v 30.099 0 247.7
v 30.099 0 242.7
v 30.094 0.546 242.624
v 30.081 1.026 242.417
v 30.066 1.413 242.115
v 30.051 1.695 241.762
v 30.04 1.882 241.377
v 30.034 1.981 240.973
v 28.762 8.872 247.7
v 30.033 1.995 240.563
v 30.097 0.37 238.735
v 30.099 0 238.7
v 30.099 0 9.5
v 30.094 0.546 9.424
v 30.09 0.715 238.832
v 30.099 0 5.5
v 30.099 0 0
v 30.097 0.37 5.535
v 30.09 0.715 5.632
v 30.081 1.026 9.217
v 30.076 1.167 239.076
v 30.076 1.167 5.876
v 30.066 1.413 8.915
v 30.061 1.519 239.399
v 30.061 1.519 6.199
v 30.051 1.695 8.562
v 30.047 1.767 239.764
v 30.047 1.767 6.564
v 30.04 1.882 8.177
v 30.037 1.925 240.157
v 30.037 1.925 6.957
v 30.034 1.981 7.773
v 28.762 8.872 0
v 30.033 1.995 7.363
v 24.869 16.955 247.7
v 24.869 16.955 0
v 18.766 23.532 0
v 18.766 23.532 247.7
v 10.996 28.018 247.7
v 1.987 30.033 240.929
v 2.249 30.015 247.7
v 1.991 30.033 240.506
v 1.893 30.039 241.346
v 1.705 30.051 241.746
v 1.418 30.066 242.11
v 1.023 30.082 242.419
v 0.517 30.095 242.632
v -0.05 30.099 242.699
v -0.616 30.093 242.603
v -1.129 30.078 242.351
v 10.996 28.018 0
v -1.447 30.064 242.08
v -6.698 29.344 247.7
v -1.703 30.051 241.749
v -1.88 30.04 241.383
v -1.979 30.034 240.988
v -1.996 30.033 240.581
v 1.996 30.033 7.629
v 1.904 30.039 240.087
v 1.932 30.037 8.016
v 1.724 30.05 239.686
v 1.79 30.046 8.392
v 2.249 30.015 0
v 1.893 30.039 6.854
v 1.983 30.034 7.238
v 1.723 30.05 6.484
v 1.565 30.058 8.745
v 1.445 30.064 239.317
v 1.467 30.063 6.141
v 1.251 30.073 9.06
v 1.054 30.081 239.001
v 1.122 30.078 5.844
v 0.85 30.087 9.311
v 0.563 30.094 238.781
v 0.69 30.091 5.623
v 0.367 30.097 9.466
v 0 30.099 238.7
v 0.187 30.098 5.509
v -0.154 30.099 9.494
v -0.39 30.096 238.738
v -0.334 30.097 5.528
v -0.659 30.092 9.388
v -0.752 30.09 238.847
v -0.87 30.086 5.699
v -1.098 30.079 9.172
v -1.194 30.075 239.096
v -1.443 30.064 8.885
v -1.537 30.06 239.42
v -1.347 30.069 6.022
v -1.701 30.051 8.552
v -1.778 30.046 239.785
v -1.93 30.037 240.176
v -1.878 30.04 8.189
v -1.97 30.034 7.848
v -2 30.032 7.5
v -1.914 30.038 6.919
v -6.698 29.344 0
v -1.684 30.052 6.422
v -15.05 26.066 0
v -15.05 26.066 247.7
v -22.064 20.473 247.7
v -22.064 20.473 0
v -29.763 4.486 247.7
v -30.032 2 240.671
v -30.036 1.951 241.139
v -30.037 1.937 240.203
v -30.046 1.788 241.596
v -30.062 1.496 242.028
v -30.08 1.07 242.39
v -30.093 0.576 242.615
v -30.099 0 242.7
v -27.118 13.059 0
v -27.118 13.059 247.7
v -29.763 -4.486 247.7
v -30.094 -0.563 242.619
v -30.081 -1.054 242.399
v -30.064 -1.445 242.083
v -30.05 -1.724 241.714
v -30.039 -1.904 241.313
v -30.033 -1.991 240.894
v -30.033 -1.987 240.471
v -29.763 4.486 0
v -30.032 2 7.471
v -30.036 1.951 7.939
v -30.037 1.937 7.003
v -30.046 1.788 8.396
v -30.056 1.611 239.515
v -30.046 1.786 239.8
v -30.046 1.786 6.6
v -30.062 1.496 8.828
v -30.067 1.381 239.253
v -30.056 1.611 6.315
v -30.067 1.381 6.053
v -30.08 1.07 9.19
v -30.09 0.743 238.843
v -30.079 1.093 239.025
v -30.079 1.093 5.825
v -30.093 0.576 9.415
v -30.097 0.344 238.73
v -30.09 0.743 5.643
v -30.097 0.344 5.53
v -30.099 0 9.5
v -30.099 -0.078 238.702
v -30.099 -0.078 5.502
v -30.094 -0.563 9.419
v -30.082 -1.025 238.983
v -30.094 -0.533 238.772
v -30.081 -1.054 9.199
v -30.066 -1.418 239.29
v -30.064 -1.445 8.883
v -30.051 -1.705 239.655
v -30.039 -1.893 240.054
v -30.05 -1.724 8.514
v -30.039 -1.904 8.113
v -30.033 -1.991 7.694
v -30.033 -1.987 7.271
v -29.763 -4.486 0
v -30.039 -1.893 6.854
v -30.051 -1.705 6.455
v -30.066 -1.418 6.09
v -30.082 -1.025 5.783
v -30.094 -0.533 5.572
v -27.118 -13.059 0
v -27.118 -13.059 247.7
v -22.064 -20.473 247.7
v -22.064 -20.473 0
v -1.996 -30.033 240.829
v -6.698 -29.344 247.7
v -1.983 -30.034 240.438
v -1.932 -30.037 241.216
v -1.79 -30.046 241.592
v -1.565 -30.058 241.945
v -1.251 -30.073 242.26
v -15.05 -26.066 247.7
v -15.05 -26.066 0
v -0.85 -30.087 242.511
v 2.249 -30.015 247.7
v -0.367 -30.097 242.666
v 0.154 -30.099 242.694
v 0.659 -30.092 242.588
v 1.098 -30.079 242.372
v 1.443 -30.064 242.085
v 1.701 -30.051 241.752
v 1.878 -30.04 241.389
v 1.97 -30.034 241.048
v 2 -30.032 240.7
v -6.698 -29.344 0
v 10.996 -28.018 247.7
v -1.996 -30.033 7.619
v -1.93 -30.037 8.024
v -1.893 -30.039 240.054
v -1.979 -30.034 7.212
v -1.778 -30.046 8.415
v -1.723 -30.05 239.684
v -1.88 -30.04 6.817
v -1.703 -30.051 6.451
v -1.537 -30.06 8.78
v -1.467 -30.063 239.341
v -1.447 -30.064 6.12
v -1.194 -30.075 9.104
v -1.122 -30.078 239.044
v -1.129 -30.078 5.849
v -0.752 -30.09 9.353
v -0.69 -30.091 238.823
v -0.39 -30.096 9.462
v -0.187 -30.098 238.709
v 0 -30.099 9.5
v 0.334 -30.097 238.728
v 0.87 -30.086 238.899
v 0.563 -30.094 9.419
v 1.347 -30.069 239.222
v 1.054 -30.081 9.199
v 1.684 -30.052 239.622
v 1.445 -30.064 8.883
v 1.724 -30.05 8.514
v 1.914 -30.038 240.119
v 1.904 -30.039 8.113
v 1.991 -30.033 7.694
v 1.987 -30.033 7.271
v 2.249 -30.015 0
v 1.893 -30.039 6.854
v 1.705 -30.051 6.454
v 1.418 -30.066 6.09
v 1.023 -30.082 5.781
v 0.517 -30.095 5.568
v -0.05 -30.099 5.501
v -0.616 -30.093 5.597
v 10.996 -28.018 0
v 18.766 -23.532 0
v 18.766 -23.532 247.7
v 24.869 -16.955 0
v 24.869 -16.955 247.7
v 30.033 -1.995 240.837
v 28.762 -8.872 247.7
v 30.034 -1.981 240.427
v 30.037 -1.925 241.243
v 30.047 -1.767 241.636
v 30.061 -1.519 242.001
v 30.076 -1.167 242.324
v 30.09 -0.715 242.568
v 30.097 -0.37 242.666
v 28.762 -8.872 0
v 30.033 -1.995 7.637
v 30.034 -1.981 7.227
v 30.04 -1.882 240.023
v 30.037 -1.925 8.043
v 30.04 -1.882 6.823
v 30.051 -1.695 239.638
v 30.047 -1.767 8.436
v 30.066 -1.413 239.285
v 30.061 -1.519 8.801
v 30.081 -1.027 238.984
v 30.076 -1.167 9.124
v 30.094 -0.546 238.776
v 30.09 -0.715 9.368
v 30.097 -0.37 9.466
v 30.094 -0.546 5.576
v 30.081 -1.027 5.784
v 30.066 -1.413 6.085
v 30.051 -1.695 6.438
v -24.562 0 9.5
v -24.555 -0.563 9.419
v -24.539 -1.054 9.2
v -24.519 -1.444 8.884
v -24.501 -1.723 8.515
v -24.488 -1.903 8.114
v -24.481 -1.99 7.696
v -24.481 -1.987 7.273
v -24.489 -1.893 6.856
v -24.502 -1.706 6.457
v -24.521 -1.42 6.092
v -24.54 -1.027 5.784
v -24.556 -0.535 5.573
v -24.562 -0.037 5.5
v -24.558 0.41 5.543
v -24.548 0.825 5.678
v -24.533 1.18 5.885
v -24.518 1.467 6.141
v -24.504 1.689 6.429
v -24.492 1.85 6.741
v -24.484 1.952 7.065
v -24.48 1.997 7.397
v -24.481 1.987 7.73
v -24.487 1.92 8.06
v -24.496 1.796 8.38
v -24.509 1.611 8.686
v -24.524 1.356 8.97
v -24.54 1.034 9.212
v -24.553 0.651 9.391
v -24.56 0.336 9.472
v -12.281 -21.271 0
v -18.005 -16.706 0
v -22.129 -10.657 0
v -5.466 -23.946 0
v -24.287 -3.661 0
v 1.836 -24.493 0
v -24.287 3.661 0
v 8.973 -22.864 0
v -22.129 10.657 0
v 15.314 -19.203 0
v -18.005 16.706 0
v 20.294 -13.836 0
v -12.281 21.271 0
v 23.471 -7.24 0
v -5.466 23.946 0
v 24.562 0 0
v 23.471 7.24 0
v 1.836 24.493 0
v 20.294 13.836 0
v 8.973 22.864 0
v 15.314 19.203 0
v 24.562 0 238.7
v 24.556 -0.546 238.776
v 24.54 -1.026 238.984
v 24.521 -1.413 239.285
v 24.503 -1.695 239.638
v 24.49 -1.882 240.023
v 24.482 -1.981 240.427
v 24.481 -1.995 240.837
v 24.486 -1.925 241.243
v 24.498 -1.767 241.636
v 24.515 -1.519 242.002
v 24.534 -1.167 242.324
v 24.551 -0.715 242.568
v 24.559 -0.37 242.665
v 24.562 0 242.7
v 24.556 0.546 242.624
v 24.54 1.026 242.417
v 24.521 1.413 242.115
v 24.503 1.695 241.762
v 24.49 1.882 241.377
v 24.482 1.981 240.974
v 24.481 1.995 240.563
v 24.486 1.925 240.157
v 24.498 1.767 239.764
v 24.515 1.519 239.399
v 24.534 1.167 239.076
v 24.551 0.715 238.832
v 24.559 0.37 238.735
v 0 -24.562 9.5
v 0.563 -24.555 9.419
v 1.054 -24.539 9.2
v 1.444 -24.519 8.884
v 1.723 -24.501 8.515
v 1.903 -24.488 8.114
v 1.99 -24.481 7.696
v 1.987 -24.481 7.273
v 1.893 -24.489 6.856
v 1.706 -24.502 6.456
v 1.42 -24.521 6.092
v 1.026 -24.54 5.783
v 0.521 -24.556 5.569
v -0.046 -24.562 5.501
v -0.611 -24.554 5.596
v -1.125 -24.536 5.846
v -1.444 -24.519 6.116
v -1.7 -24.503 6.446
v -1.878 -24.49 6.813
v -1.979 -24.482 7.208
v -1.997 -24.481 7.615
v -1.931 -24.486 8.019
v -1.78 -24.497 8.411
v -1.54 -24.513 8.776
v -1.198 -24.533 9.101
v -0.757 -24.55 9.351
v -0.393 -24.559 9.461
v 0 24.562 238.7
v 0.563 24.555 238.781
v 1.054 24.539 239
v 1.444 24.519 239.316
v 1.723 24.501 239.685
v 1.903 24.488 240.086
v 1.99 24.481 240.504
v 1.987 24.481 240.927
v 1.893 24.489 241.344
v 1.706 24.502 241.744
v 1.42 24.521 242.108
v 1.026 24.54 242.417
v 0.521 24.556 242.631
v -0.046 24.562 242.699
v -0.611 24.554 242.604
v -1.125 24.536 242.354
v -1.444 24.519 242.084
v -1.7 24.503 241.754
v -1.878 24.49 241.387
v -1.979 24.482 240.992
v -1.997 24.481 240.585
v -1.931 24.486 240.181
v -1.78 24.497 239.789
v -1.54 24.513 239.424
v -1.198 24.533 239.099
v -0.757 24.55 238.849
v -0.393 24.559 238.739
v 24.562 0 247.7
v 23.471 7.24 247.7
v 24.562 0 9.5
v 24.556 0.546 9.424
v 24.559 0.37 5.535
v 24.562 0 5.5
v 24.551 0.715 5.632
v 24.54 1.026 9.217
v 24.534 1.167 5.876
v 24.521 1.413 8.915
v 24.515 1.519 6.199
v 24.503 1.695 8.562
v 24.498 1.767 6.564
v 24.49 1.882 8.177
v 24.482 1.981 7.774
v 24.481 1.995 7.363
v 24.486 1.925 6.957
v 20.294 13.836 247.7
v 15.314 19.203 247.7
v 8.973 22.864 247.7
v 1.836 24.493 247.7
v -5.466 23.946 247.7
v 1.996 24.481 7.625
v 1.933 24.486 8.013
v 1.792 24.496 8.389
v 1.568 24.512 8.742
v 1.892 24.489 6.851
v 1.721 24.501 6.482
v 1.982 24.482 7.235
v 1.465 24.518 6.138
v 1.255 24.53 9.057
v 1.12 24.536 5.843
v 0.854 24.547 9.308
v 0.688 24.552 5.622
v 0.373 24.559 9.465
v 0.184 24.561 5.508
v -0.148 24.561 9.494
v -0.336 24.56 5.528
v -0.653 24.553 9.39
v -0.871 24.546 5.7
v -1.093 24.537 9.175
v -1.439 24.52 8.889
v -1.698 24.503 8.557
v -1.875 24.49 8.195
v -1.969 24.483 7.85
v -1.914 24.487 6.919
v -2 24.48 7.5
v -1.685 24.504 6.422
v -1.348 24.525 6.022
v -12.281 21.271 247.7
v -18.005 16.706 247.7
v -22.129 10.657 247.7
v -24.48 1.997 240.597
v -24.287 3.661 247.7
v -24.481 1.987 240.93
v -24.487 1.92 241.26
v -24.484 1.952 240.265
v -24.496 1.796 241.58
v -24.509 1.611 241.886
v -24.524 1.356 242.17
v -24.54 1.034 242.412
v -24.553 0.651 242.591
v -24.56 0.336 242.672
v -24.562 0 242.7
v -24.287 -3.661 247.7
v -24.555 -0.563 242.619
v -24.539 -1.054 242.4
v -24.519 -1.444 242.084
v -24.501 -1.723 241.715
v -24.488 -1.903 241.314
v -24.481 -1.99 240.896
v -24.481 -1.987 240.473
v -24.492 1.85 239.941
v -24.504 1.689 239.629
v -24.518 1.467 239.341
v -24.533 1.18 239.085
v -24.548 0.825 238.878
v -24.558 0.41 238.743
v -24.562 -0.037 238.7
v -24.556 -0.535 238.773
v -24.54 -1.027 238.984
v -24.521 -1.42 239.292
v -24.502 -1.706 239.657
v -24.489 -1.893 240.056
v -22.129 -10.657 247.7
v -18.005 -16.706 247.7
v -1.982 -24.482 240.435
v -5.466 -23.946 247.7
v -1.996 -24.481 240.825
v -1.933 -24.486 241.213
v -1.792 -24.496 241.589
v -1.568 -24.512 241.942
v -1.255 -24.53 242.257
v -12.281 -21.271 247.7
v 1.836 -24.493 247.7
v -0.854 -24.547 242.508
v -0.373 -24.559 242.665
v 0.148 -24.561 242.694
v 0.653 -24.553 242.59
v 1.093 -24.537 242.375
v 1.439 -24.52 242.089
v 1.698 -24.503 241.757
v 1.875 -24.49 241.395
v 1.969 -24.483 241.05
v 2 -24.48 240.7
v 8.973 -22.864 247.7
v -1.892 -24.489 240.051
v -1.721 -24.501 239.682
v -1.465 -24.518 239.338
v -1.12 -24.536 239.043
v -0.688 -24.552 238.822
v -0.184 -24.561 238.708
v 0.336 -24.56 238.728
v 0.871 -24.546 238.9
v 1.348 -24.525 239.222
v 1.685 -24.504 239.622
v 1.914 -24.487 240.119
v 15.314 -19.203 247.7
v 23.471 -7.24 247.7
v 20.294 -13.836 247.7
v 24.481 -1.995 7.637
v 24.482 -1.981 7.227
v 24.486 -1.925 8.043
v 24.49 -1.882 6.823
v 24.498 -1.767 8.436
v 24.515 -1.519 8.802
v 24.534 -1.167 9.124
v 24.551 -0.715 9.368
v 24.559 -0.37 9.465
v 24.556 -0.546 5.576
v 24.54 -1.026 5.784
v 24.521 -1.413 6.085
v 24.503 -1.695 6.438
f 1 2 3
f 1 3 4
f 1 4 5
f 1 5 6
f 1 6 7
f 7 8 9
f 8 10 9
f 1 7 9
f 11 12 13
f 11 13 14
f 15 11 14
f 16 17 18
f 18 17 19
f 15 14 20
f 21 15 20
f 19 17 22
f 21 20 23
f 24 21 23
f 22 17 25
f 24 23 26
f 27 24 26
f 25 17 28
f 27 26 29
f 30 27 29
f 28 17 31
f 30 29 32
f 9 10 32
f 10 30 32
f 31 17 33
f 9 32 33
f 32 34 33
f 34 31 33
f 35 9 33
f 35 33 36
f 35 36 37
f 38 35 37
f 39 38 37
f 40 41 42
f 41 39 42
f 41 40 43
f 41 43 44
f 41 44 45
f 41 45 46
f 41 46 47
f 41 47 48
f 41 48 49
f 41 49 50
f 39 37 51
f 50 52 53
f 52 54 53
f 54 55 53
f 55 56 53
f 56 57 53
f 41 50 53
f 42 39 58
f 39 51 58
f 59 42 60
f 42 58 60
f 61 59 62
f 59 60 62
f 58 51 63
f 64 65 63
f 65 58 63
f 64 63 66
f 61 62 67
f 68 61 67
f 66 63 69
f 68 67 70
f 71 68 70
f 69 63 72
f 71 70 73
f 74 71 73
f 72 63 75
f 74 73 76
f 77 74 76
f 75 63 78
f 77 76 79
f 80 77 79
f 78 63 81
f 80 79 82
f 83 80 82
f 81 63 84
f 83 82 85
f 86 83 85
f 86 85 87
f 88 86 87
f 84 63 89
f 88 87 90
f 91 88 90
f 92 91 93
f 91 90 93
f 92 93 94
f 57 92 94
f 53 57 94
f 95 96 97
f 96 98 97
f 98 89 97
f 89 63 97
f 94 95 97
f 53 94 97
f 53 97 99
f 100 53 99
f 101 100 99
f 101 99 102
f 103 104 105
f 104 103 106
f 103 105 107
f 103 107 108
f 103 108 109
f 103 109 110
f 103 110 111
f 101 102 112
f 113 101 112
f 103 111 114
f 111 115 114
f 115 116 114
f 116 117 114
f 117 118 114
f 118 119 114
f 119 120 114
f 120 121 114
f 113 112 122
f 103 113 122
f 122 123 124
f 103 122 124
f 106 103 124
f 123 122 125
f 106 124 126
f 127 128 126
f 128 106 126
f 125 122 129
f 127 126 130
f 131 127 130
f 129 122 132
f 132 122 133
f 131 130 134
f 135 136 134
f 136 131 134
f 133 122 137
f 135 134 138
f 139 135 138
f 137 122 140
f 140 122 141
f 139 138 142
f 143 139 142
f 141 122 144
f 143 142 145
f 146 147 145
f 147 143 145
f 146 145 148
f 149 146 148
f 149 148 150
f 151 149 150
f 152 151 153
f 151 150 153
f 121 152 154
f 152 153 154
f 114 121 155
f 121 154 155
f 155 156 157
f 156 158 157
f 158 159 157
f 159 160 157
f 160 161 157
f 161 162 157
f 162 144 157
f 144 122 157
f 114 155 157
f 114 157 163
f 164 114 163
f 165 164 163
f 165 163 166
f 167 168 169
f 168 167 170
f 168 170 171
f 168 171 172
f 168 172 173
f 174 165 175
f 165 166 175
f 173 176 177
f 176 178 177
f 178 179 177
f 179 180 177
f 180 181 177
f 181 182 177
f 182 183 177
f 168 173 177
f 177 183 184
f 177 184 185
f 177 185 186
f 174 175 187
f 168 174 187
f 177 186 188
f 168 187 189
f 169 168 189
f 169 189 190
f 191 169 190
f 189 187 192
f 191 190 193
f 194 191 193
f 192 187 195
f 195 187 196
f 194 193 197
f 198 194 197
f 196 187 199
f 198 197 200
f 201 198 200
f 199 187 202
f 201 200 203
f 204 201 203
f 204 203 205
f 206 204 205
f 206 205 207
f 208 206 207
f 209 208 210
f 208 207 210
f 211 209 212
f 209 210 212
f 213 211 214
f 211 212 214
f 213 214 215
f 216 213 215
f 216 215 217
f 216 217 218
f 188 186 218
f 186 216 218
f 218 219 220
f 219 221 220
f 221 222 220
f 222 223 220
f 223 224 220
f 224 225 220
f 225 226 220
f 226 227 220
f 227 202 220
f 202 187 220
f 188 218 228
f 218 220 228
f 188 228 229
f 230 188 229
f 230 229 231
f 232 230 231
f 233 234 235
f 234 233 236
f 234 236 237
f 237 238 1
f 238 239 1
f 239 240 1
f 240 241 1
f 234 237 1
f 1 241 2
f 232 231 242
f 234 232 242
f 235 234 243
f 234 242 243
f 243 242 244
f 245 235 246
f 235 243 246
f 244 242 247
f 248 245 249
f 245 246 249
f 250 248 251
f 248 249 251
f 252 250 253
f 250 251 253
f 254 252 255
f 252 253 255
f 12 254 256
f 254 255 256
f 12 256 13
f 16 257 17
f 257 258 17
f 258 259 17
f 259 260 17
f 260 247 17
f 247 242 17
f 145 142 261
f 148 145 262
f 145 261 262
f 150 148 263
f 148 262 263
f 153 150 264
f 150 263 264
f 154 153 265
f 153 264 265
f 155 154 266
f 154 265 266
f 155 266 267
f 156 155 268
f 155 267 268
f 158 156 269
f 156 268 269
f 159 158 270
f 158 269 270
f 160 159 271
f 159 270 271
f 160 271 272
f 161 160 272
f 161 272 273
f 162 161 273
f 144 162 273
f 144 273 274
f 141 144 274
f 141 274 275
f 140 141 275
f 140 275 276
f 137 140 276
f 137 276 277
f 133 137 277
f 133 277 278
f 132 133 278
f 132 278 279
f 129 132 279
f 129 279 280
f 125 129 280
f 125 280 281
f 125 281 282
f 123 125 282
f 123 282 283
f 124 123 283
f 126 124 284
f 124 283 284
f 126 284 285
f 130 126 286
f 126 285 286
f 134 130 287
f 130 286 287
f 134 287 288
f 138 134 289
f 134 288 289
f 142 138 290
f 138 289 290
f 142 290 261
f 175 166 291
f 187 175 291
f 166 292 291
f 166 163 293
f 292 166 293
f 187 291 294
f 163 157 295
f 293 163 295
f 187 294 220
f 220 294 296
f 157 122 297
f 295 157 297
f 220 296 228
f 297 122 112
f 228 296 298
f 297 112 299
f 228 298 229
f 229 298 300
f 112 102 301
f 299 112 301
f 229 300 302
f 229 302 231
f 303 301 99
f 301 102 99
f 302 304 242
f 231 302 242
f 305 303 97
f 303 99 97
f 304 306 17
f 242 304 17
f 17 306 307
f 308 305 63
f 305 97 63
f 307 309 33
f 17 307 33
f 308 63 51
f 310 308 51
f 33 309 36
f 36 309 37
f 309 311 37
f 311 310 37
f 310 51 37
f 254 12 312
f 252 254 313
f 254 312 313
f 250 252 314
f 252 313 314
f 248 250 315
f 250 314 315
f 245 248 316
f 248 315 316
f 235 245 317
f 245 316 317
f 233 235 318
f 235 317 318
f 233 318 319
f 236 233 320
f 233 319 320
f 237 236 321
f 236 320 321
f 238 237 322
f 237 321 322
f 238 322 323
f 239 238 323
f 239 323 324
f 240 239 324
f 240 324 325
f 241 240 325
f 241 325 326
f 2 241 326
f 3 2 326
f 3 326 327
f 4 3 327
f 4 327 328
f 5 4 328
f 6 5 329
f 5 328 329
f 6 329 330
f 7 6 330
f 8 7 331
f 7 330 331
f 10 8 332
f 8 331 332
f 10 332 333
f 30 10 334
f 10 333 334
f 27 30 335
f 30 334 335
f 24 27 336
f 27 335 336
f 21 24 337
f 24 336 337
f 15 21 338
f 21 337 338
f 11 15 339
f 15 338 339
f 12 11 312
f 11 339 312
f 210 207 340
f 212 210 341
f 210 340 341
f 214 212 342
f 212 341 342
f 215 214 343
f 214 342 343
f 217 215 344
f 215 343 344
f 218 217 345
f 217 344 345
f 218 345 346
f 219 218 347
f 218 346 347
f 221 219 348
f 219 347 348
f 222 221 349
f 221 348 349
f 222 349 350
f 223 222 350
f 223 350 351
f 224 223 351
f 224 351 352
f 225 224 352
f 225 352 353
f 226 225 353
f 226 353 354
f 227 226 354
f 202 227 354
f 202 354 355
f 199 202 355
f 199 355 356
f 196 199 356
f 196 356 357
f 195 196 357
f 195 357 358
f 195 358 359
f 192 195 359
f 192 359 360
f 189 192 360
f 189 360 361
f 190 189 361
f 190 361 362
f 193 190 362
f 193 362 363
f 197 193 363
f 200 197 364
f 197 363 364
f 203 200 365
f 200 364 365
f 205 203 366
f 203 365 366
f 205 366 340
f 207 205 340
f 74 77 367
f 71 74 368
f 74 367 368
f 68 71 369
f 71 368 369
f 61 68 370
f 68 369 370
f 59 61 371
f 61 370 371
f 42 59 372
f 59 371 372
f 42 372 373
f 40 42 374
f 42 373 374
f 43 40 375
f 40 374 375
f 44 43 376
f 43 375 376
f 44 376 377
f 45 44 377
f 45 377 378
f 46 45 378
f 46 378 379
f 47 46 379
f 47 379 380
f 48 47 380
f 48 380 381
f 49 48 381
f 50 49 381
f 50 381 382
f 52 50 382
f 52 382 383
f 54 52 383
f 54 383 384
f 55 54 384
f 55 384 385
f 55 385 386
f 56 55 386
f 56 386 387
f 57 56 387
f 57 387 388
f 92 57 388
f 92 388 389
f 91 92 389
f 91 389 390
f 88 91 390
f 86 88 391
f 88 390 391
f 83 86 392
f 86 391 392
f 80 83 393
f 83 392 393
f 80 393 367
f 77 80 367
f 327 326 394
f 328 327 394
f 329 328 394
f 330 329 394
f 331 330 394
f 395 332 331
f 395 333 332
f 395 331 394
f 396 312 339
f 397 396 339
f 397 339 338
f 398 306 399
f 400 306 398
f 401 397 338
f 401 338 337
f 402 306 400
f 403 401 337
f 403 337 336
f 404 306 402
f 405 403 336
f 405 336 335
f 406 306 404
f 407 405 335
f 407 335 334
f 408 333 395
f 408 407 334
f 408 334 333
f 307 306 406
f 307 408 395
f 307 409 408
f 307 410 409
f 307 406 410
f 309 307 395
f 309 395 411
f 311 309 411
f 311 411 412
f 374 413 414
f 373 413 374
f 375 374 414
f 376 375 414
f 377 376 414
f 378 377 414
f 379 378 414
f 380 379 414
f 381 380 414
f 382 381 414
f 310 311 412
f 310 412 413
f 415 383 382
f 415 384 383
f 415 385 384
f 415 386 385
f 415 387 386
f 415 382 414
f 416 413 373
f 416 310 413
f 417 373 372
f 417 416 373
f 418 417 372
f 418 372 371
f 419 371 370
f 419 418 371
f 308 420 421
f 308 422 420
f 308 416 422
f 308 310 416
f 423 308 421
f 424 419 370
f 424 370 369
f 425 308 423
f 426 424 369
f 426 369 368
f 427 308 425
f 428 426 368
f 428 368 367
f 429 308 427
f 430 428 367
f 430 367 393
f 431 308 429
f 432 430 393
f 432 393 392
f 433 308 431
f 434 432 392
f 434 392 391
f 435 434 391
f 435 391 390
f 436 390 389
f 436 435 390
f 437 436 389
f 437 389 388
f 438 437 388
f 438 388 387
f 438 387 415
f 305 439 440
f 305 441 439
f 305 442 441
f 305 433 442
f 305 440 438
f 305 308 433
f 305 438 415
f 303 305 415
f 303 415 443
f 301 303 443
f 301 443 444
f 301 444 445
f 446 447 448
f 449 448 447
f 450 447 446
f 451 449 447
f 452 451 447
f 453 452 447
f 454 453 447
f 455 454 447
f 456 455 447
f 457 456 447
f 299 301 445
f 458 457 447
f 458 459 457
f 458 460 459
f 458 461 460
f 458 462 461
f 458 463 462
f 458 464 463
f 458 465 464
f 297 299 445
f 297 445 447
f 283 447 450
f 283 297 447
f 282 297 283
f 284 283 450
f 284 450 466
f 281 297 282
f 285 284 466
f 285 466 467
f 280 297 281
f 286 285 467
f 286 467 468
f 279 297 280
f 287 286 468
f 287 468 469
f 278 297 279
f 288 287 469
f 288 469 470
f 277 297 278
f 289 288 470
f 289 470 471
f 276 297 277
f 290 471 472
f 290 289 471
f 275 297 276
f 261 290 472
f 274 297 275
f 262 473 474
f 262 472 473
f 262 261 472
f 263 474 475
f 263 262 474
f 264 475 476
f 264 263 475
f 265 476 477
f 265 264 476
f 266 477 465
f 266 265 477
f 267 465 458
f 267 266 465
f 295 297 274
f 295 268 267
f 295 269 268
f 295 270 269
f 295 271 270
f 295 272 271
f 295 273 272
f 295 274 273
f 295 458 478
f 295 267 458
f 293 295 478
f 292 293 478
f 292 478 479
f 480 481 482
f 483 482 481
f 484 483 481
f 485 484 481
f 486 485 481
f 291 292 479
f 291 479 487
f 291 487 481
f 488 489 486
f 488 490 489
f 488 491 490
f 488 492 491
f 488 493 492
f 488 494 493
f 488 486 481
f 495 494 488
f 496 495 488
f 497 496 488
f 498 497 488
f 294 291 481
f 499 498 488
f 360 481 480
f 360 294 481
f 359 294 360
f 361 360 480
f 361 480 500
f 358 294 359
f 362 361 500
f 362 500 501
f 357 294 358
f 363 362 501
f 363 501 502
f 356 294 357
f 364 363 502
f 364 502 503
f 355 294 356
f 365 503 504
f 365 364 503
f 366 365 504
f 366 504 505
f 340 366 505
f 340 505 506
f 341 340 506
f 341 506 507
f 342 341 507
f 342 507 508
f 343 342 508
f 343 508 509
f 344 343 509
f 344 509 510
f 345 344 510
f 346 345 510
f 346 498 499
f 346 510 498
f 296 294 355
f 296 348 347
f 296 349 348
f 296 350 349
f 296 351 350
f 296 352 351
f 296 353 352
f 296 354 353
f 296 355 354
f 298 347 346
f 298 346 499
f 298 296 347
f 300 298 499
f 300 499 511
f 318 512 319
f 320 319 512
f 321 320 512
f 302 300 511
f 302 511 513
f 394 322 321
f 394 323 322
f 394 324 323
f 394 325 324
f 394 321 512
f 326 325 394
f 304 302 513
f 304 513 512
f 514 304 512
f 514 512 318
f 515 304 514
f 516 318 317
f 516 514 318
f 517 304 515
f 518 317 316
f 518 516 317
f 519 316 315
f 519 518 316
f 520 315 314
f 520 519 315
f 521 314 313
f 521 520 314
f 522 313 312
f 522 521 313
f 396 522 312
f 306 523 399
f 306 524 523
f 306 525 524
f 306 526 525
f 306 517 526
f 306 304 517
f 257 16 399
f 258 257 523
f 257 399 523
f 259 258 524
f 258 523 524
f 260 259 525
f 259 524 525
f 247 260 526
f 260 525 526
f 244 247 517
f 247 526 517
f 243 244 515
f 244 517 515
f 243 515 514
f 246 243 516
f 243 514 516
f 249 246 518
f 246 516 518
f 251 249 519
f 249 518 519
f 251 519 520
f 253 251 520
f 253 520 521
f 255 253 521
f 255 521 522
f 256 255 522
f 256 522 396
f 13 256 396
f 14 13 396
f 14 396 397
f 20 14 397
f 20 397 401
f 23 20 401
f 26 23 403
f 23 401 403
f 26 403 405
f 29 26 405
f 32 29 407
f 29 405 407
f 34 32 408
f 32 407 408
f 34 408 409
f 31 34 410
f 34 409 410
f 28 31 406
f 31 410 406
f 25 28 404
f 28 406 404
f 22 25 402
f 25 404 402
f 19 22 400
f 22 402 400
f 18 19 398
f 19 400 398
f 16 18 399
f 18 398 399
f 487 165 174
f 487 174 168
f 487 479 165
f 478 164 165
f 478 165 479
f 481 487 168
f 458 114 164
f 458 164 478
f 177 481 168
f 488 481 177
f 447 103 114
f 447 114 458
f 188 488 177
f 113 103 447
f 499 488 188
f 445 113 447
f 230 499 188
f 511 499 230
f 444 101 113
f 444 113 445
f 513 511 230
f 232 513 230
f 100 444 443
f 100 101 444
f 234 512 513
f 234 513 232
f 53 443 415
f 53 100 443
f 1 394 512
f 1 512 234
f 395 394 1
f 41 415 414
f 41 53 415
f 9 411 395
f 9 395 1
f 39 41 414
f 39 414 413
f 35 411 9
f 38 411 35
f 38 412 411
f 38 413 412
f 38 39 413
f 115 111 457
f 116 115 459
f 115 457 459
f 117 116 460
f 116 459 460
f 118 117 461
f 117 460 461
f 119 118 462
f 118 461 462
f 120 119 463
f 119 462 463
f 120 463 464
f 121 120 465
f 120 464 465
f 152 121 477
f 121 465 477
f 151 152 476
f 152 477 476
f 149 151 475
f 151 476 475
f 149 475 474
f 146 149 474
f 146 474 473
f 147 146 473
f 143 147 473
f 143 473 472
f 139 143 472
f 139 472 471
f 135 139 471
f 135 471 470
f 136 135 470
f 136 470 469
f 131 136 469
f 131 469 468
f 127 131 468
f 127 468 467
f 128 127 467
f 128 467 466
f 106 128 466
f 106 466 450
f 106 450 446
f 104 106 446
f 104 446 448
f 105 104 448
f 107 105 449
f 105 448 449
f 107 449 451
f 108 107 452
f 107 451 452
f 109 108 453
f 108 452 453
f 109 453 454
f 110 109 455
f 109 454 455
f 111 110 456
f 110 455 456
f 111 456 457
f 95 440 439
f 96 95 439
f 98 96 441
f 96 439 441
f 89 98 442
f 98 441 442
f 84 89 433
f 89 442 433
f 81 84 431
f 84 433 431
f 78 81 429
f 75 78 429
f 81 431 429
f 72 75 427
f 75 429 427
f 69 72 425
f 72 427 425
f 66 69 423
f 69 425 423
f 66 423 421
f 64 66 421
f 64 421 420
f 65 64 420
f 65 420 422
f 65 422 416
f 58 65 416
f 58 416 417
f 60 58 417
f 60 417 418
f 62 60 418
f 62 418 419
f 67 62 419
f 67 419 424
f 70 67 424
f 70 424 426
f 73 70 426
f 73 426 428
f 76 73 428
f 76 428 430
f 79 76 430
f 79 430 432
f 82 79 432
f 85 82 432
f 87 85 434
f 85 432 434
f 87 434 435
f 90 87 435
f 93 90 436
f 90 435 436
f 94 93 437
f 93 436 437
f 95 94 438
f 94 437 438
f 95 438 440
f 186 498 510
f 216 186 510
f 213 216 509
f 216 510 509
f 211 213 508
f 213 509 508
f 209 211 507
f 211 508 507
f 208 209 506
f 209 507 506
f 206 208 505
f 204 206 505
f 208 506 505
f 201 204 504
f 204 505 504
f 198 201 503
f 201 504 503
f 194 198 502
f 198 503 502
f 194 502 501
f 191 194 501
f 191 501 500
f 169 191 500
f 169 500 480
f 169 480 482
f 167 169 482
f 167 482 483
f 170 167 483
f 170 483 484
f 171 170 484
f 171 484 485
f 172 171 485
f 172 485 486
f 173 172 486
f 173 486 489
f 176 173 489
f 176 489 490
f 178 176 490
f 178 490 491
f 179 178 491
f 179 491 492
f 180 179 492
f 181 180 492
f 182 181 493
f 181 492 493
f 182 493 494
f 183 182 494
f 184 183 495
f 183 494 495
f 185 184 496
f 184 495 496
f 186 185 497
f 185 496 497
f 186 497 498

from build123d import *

# Parameters (mm, degrees)
SKETCH1_R                           = 30.099
SKETCH1_R_2                         = 24.5618
BOSS_EXTRUDE1_DEPTH                 = 247.7
F_4_0MM_DOWEL_HOLE1_D               = 4
F_4_0MM_DOWEL_HOLE1_DEPTH           = 6
F_4_0MM_DOWEL_HOLE1_TIP             = 1.201721238
F_4_0MM_DOWEL_HOLE1_ON_FACE_2_D     = 4
F_4_0MM_DOWEL_HOLE1_ON_FACE_2_DEPTH = 6
F_4_0MM_DOWEL_HOLE1_ON_FACE_2_TIP   = 1.201721238
F_4_0MM_DOWEL_HOLE1_ON_FACE_3_D     = 4
F_4_0MM_DOWEL_HOLE1_ON_FACE_3_DEPTH = 6
F_4_0MM_DOWEL_HOLE1_ON_FACE_3_TIP   = 1.201721238
F_4_0MM_DOWEL_HOLE1_ON_FACE_4_D     = 4
F_4_0MM_DOWEL_HOLE1_ON_FACE_4_DEPTH = 6
F_4_0MM_DOWEL_HOLE1_ON_FACE_4_TIP   = 1.201721238
F_4_0MM_DOWEL_HOLE2_D               = 4
F_4_0MM_DOWEL_HOLE2_DEPTH           = 6
F_4_0MM_DOWEL_HOLE2_TIP             = 1.201721238
F_4_0MM_DOWEL_HOLE2_ON_FACE_2_D     = 4
F_4_0MM_DOWEL_HOLE2_ON_FACE_2_DEPTH = 6
F_4_0MM_DOWEL_HOLE2_ON_FACE_2_TIP   = 1.201721238
F_4_0MM_DOWEL_HOLE2_ON_FACE_3_D     = 4
F_4_0MM_DOWEL_HOLE2_ON_FACE_3_DEPTH = 6
F_4_0MM_DOWEL_HOLE2_ON_FACE_3_TIP   = 1.201721238
F_4_0MM_DOWEL_HOLE2_ON_FACE_4_D     = 4
F_4_0MM_DOWEL_HOLE2_ON_FACE_4_DEPTH = 6
F_4_0MM_DOWEL_HOLE2_ON_FACE_4_TIP   = 1.201721238


with BuildPart() as part:
    # Sketch1 → Boss-Extrude1 (new body)
    with BuildSketch(Plane.XY):
        Circle(SKETCH1_R)
        Circle(SKETCH1_R_2, mode=Mode.SUBTRACT)
    extrude(amount=BOSS_EXTRUDE1_DEPTH)

    # Ø4.0mm Dowel Hole1
    with Locations(Plane(origin=(0, 30.099, 7.5), x_dir=(1, 0, 0), z_dir=(0, 1, 0))):
        with Locations((0, 0)):
            Hole(F_4_0MM_DOWEL_HOLE1_D / 2, depth=F_4_0MM_DOWEL_HOLE1_DEPTH)
            with Locations((0, 0, -(F_4_0MM_DOWEL_HOLE1_DEPTH + F_4_0MM_DOWEL_HOLE1_TIP / 2))):  # 118° drill point
                Cone(0, F_4_0MM_DOWEL_HOLE1_D / 2, F_4_0MM_DOWEL_HOLE1_TIP, mode=Mode.SUBTRACT)

    # Ø4.0mm Dowel Hole1 on face 2
    with Locations(Plane(origin=(30.099, 0, 7.5), x_dir=(0, 0, 1), z_dir=(1, 0, 0))):
        with Locations((0, 0)):
            Hole(F_4_0MM_DOWEL_HOLE1_ON_FACE_2_D / 2, depth=F_4_0MM_DOWEL_HOLE1_ON_FACE_2_DEPTH)
            with Locations((0, 0, -(F_4_0MM_DOWEL_HOLE1_ON_FACE_2_DEPTH + F_4_0MM_DOWEL_HOLE1_ON_FACE_2_TIP / 2))):  # 118° drill point
                Cone(0, F_4_0MM_DOWEL_HOLE1_ON_FACE_2_D / 2, F_4_0MM_DOWEL_HOLE1_ON_FACE_2_TIP, mode=Mode.SUBTRACT)

    # Ø4.0mm Dowel Hole1 on face 3
    with Locations(Plane(origin=(0, -30.099, 7.5), x_dir=(0, 0, -1), z_dir=(0, -1, 0))):
        with Locations((0, 0)):
            Hole(F_4_0MM_DOWEL_HOLE1_ON_FACE_3_D / 2, depth=F_4_0MM_DOWEL_HOLE1_ON_FACE_3_DEPTH)
            with Locations((0, 0, -(F_4_0MM_DOWEL_HOLE1_ON_FACE_3_DEPTH + F_4_0MM_DOWEL_HOLE1_ON_FACE_3_TIP / 2))):  # 118° drill point
                Cone(0, F_4_0MM_DOWEL_HOLE1_ON_FACE_3_D / 2, F_4_0MM_DOWEL_HOLE1_ON_FACE_3_TIP, mode=Mode.SUBTRACT)

    # Ø4.0mm Dowel Hole1 on face 4
    with Locations(Plane(origin=(-30.099, 0, 7.5), x_dir=(0, 0, -1), z_dir=(-1, 0, 0))):
        with Locations((0, 0)):
            Hole(F_4_0MM_DOWEL_HOLE1_ON_FACE_4_D / 2, depth=F_4_0MM_DOWEL_HOLE1_ON_FACE_4_DEPTH)
            with Locations((0, 0, -(F_4_0MM_DOWEL_HOLE1_ON_FACE_4_DEPTH + F_4_0MM_DOWEL_HOLE1_ON_FACE_4_TIP / 2))):  # 118° drill point
                Cone(0, F_4_0MM_DOWEL_HOLE1_ON_FACE_4_D / 2, F_4_0MM_DOWEL_HOLE1_ON_FACE_4_TIP, mode=Mode.SUBTRACT)

    # Ø4.0mm Dowel Hole2
    with Locations(Plane(origin=(0, -30.099, 240.7), x_dir=(-1, 0, 0), z_dir=(0, -1, 0))):
        with Locations((0, 0)):
            Hole(F_4_0MM_DOWEL_HOLE2_D / 2, depth=F_4_0MM_DOWEL_HOLE2_DEPTH)
            with Locations((0, 0, -(F_4_0MM_DOWEL_HOLE2_DEPTH + F_4_0MM_DOWEL_HOLE2_TIP / 2))):  # 118° drill point
                Cone(0, F_4_0MM_DOWEL_HOLE2_D / 2, F_4_0MM_DOWEL_HOLE2_TIP, mode=Mode.SUBTRACT)

    # Ø4.0mm Dowel Hole2 on face 2
    with Locations(Plane(origin=(-30.099, 0, 240.7), x_dir=(0, 0, -1), z_dir=(-1, 0, 0))):
        with Locations((0, 0)):
            Hole(F_4_0MM_DOWEL_HOLE2_ON_FACE_2_D / 2, depth=F_4_0MM_DOWEL_HOLE2_ON_FACE_2_DEPTH)
            with Locations((0, 0, -(F_4_0MM_DOWEL_HOLE2_ON_FACE_2_DEPTH + F_4_0MM_DOWEL_HOLE2_ON_FACE_2_TIP / 2))):  # 118° drill point
                Cone(0, F_4_0MM_DOWEL_HOLE2_ON_FACE_2_D / 2, F_4_0MM_DOWEL_HOLE2_ON_FACE_2_TIP, mode=Mode.SUBTRACT)

    # Ø4.0mm Dowel Hole2 on face 3
    with Locations(Plane(origin=(0, 30.099, 240.7), x_dir=(0, 0, 1), z_dir=(0, 1, 0))):
        with Locations((0, 0)):
            Hole(F_4_0MM_DOWEL_HOLE2_ON_FACE_3_D / 2, depth=F_4_0MM_DOWEL_HOLE2_ON_FACE_3_DEPTH)
            with Locations((0, 0, -(F_4_0MM_DOWEL_HOLE2_ON_FACE_3_DEPTH + F_4_0MM_DOWEL_HOLE2_ON_FACE_3_TIP / 2))):  # 118° drill point
                Cone(0, F_4_0MM_DOWEL_HOLE2_ON_FACE_3_D / 2, F_4_0MM_DOWEL_HOLE2_ON_FACE_3_TIP, mode=Mode.SUBTRACT)

    # Ø4.0mm Dowel Hole2 on face 4
    with Locations(Plane(origin=(30.099, 0, 240.7), x_dir=(0, 0, 1), z_dir=(1, 0, 0))):
        with Locations((0, 0)):
            Hole(F_4_0MM_DOWEL_HOLE2_ON_FACE_4_D / 2, depth=F_4_0MM_DOWEL_HOLE2_ON_FACE_4_DEPTH)
            with Locations((0, 0, -(F_4_0MM_DOWEL_HOLE2_ON_FACE_4_DEPTH + F_4_0MM_DOWEL_HOLE2_ON_FACE_4_TIP / 2))):  # 118° drill point
                Cone(0, F_4_0MM_DOWEL_HOLE2_ON_FACE_4_D / 2, F_4_0MM_DOWEL_HOLE2_ON_FACE_4_TIP, mode=Mode.SUBTRACT)


solid = part.part
